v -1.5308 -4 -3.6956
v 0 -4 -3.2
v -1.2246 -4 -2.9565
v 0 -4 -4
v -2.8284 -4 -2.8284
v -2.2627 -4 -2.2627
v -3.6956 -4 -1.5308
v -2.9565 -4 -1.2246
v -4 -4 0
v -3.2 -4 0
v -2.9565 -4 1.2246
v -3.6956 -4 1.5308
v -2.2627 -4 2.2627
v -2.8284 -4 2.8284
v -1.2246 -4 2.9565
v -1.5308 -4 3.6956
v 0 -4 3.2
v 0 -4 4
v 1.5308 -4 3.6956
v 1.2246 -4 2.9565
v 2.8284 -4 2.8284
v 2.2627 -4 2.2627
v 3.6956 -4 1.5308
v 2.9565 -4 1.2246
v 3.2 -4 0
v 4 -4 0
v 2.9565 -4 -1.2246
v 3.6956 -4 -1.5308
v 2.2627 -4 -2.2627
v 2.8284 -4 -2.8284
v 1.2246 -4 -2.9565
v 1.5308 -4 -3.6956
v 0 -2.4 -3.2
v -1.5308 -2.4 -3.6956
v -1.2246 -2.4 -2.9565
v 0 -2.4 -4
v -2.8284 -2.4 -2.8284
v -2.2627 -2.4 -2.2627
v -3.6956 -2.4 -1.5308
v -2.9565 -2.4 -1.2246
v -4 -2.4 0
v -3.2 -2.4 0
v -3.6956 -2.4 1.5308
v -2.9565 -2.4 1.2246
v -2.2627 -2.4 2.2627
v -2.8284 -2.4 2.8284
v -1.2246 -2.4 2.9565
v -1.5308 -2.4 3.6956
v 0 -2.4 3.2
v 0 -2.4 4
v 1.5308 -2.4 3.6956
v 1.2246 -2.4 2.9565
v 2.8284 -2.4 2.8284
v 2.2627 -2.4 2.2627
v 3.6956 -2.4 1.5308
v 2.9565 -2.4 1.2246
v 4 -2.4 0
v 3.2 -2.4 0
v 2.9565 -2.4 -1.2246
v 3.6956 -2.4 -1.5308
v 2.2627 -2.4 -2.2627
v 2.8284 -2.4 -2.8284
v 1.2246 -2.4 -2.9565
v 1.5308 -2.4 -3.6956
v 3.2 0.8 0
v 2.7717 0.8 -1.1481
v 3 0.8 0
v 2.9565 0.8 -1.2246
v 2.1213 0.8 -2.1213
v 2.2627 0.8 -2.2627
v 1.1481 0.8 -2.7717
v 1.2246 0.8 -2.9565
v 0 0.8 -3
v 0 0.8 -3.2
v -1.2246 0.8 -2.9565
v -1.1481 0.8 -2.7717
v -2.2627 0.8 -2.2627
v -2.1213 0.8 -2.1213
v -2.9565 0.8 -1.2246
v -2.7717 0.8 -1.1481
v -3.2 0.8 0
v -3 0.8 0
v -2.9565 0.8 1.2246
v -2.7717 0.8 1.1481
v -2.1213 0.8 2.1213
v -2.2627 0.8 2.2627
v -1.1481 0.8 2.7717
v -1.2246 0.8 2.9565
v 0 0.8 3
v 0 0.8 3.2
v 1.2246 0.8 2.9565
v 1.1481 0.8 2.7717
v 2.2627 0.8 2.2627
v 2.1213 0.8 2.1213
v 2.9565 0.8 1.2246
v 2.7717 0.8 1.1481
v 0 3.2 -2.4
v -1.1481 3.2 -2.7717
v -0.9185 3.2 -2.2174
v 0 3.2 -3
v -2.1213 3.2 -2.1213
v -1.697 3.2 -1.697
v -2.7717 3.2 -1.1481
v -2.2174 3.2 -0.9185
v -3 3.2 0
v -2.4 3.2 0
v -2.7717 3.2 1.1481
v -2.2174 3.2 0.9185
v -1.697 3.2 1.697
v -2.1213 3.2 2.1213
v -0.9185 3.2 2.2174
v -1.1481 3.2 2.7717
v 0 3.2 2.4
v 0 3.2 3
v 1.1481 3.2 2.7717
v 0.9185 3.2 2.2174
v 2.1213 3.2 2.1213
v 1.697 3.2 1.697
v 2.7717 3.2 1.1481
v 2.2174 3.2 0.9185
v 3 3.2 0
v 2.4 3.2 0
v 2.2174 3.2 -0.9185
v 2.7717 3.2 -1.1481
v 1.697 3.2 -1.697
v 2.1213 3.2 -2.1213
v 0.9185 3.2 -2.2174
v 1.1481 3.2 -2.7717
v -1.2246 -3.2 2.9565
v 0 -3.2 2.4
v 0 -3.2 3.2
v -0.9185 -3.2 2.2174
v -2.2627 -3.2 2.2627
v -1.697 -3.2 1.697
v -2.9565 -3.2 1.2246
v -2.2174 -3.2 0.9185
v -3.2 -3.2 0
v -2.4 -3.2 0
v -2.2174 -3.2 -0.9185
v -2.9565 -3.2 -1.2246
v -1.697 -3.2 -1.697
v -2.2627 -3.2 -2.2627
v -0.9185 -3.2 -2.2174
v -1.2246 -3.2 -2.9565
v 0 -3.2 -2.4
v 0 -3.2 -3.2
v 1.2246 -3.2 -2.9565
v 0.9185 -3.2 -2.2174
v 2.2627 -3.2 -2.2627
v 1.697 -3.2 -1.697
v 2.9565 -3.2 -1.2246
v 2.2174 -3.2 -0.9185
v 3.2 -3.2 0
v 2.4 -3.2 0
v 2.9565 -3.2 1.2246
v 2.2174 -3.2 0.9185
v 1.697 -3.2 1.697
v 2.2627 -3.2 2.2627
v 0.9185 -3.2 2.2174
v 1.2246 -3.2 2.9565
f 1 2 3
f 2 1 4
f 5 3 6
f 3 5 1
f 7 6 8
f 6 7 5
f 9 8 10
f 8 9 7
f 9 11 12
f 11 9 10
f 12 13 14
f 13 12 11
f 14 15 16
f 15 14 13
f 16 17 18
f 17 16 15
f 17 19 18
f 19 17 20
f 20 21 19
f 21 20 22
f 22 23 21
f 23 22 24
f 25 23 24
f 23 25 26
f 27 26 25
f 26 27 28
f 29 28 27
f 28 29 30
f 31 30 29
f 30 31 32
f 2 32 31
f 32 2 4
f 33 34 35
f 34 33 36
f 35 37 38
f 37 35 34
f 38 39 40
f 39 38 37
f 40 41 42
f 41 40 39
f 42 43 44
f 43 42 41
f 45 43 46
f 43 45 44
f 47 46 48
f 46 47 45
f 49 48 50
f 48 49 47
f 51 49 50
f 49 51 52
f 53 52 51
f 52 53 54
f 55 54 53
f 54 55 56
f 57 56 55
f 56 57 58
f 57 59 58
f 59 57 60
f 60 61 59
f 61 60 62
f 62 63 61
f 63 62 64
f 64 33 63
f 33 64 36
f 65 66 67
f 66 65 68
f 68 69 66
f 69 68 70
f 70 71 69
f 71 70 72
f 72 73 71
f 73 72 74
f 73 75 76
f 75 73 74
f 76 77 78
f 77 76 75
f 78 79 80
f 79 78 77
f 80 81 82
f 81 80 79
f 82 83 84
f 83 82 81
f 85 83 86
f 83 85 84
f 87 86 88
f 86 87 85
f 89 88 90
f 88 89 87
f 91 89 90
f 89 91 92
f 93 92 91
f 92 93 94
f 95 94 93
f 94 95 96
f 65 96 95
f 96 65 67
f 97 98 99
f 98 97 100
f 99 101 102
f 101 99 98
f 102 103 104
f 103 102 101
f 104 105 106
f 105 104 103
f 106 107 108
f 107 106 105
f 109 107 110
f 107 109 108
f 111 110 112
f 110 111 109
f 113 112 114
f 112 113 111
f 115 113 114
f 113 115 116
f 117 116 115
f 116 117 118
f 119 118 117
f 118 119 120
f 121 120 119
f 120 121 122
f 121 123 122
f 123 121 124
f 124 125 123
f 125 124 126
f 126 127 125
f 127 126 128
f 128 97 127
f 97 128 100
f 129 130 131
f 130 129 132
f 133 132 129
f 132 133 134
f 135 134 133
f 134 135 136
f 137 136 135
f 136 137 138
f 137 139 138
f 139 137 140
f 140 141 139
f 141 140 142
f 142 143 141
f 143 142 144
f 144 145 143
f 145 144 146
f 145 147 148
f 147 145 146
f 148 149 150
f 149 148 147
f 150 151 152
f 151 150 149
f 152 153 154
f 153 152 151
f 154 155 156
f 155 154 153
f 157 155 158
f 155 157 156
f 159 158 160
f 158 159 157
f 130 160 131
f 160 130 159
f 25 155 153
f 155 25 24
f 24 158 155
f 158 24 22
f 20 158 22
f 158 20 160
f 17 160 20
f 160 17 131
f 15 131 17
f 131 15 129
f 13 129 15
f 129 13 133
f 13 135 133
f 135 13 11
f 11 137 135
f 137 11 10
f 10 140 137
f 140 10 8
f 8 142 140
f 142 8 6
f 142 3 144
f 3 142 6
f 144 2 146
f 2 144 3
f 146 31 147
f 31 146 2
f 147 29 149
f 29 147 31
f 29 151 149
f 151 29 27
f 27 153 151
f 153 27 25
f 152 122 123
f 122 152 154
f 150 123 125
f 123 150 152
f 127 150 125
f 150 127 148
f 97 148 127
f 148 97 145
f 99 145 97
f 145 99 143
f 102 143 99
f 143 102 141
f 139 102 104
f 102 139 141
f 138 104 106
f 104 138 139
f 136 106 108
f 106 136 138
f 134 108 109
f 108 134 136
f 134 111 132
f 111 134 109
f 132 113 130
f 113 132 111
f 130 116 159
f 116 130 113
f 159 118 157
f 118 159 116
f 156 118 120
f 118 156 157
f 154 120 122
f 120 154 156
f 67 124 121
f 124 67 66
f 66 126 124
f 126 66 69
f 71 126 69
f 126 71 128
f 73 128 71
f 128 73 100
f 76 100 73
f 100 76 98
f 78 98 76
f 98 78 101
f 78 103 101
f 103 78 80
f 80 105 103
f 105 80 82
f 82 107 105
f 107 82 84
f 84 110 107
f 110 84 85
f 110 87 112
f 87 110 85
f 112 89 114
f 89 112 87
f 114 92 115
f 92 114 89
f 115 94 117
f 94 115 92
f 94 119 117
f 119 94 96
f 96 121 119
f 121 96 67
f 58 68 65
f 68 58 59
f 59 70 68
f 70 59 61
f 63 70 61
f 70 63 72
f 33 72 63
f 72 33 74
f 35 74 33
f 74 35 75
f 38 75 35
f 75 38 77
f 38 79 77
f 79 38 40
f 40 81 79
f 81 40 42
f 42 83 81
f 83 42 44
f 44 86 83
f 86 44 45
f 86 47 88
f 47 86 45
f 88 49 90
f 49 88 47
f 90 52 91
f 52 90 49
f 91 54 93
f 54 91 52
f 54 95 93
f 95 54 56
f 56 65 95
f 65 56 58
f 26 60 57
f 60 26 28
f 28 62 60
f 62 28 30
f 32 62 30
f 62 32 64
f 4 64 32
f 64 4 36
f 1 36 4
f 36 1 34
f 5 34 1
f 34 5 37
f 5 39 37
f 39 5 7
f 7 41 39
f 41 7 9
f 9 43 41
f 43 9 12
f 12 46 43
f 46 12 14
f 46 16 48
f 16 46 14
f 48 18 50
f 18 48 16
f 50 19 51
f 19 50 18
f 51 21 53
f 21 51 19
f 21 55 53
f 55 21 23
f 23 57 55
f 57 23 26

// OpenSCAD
// file: ../p/4-4ring3.scad
use <../lib.scad>
function ldraw_lib__4_4ring3() = [
// 0 Ring  3 x 1.0
// 0 Name: 4-4ring3.dat
// 0 Author: James Jessiman
// 0 !LDRAW_ORG Primitive UPDATE 2009-01
// 0 !LICENSE Licensed under CC BY 2.0 and CC BY 4.0 : see CAreadme.txt
// 
// 0 BFC CERTIFY CCW
  [0,"BFC","CERTIFY"],
  [0,"BFC","CCW"],
// 
// 0 !HISTORY 1998-12-15 [PTadmin] Official Update 1998-10
// 0 !HISTORY 2002-04-05 [hafhead] Added BFC statement
// 0 !HISTORY 2002-04-25 [PTadmin] Official Update 2002-02
// 0 !HISTORY 2007-06-24 [PTadmin] Header formatted for Contributor Agreement
// 0 !HISTORY 2008-07-01 [PTadmin] Official Update 2008-01
// 0 !HISTORY 2008-08-26 [cwdee] Switch polygon winding and rename
// 0 !HISTORY 2009-05-02 [PTadmin] Official Update 2009-01
// 
// 
// 4 16 -1.5308 0 3.6956 -1.1481 0 2.7717 0 0 3 0 0 4
  [4,16,-1.5308,0,3.6956,-1.1481,0,2.7717,0,0,3,0,0,4],
// 4 16 -2.8284 0 2.8284 -2.1213 0 2.1213 -1.1481 0 2.7717 -1.5308 0 3.6956
  [4,16,-2.8284,0,2.8284,-2.1213,0,2.1213,-1.1481,0,2.7717,-1.5308,0,3.6956],
// 4 16 -3.6956 0 1.5308 -2.7717 0 1.1481 -2.1213 0 2.1213 -2.8284 0 2.8284
  [4,16,-3.6956,0,1.5308,-2.7717,0,1.1481,-2.1213,0,2.1213,-2.8284,0,2.8284],
// 4 16 -4 0 0 -3 0 0 -2.7717 0 1.1481 -3.6956 0 1.5308
  [4,16,-4,0,0,-3,0,0,-2.7717,0,1.1481,-3.6956,0,1.5308],
// 4 16 -3.6956 0 -1.5308 -2.7717 0 -1.1481 -3 0 0 -4 0 0
  [4,16,-3.6956,0,-1.5308,-2.7717,0,-1.1481,-3,0,0,-4,0,0],
// 4 16 -2.8284 0 -2.8284 -2.1213 0 -2.1213 -2.7717 0 -1.1481 -3.6956 0 -1.5308
  [4,16,-2.8284,0,-2.8284,-2.1213,0,-2.1213,-2.7717,0,-1.1481,-3.6956,0,-1.5308],
// 4 16 -1.5308 0 -3.6956 -1.1481 0 -2.7717 -2.1213 0 -2.1213 -2.8284 0 -2.8284
  [4,16,-1.5308,0,-3.6956,-1.1481,0,-2.7717,-2.1213,0,-2.1213,-2.8284,0,-2.8284],
// 4 16 0 0 -4 0 0 -3 -1.1481 0 -2.7717 -1.5308 0 -3.6956
  [4,16,0,0,-4,0,0,-3,-1.1481,0,-2.7717,-1.5308,0,-3.6956],
// 4 16 1.5308 0 -3.6956 1.1481 0 -2.7717 0 0 -3 0 0 -4
  [4,16,1.5308,0,-3.6956,1.1481,0,-2.7717,0,0,-3,0,0,-4],
// 4 16 2.8284 0 -2.8284 2.1213 0 -2.1213 1.1481 0 -2.7717 1.5308 0 -3.6956
  [4,16,2.8284,0,-2.8284,2.1213,0,-2.1213,1.1481,0,-2.7717,1.5308,0,-3.6956],
// 4 16 3.6956 0 -1.5308 2.7717 0 -1.1481 2.1213 0 -2.1213 2.8284 0 -2.8284
  [4,16,3.6956,0,-1.5308,2.7717,0,-1.1481,2.1213,0,-2.1213,2.8284,0,-2.8284],
// 4 16 4 0 0 3 0 0 2.7717 0 -1.1481 3.6956 0 -1.5308
  [4,16,4,0,0,3,0,0,2.7717,0,-1.1481,3.6956,0,-1.5308],
// 4 16 3.6956 0 1.5308 2.7717 0 1.1481 3 0 0 4 0 0
  [4,16,3.6956,0,1.5308,2.7717,0,1.1481,3,0,0,4,0,0],
// 4 16 2.8284 0 2.8284 2.1213 0 2.1213 2.7717 0 1.1481 3.6956 0 1.5308
  [4,16,2.8284,0,2.8284,2.1213,0,2.1213,2.7717,0,1.1481,3.6956,0,1.5308],
// 4 16 1.5308 0 3.6956 1.1481 0 2.7717 2.1213 0 2.1213 2.8284 0 2.8284
  [4,16,1.5308,0,3.6956,1.1481,0,2.7717,2.1213,0,2.1213,2.8284,0,2.8284],
// 4 16 0 0 4 0 0 3 1.1481 0 2.7717 1.5308 0 3.6956
  [4,16,0,0,4,0,0,3,1.1481,0,2.7717,1.5308,0,3.6956],
// 0
];
makepoly(ldraw_lib__4_4ring3(), line=0.2);
// file: ../p/peghole.scad
use <../lib.scad>
use <4-4cyli.scad>
use <4-4edge.scad>
use <4-4ring3.scad>
function ldraw_lib__peghole() = [
// 0 Peg Hole End
// 0 Name: peghole.dat
// 0 Author: James Jessiman
// 0 !LDRAW_ORG Primitive UPDATE 2010-01
// 0 !LICENSE Licensed under CC BY 2.0 and CC BY 4.0 : see CAreadme.txt
// 
// 0 BFC CERTIFY CCW
  [0,"BFC","CERTIFY"],
  [0,"BFC","CCW"],
// 
// 0 !HISTORY 2002-05-01 [mkennedy] replace code with ring3
// 0 !HISTORY 2002-05-01 [sbliss] BFC
// 0 !HISTORY 2002-06-11 [PTadmin] Official Update 2002-03
// 0 !HISTORY 2007-06-24 [PTadmin] Header formatted for Contributor Agreement
// 0 !HISTORY 2008-07-01 [PTadmin] Official Update 2008-01
// 0 !HISTORY 2010-01-14 [cwdee] Update ring3 to 4-4ring3
// 0 !HISTORY 2010-04-05 [PTadmin] Official Update 2010-01
// 
// 
// 1 16 0 0 0 8 0 0 0 1 0 0 0 8 4-4edge.dat
  [1,16,0,0,0,8,0,0,0,1,0,0,0,8, ldraw_lib__4_4edge()],
// 1 16 0 2 0 8 0 0 0 1 0 0 0 8 4-4edge.dat
  [1,16,0,2,0,8,0,0,0,1,0,0,0,8, ldraw_lib__4_4edge()],
// 1 16 0 2 0 6 0 0 0 1 0 0 0 6 4-4edge.dat
  [1,16,0,2,0,6,0,0,0,1,0,0,0,6, ldraw_lib__4_4edge()],
// 1 16 0 2 0 2 0 0 0 1 0 0 0 2 4-4ring3.dat
  [1,16,0,2,0,2,0,0,0,1,0,0,0,2, ldraw_lib__4_4ring3()],
// 0 BFC INVERTNEXT
  [0,"BFC","INVERTNEXT"],
// 1 16 0 0 0 8 0 0 0 2 0 0 0 8 4-4cyli.dat
  [1,16,0,0,0,8,0,0,0,2,0,0,0,8, ldraw_lib__4_4cyli()],
// 0
];
makepoly(ldraw_lib__peghole(), line=0.2);
// file: ../p/4-4ring4.scad
use <../lib.scad>
function ldraw_lib__4_4ring4() = [
// 0 Ring  4 x 1.0
// 0 Name: 4-4ring4.dat
// 0 Author: James Jessiman
// 0 !LDRAW_ORG Primitive UPDATE 2009-01
// 0 !LICENSE Licensed under CC BY 2.0 and CC BY 4.0 : see CAreadme.txt
// 
// 0 BFC CERTIFY CCW
  [0,"BFC","CERTIFY"],
  [0,"BFC","CCW"],
// 
// 0 !HISTORY 1998-12-15 [PTadmin] Official Update 1998-10
// 0 !HISTORY 2002-04-08 [BrickCaster] Modified for BFC compliance
// 0 !HISTORY 2002-04-25 [PTadmin] Official Update 2002-02
// 0 !HISTORY 2007-06-24 [PTadmin] Header formatted for Contributor Agreement
// 0 !HISTORY 2008-07-01 [PTadmin] Official Update 2008-01
// 0 !HISTORY 2008-08-26 [cwdee] Switch polygon winding and rename
// 0 !HISTORY 2009-05-02 [PTadmin] Official Update 2009-01
// 
// 
// 4 16 -1.9135 0 4.6195 -1.5308 0 3.6956 0 0 4 0 0 5
  [4,16,-1.9135,0,4.6195,-1.5308,0,3.6956,0,0,4,0,0,5],
// 4 16 -3.5355 0 3.5355 -2.8284 0 2.8284 -1.5308 0 3.6956 -1.9135 0 4.6195
  [4,16,-3.5355,0,3.5355,-2.8284,0,2.8284,-1.5308,0,3.6956,-1.9135,0,4.6195],
// 4 16 -4.6195 0 1.9135 -3.6956 0 1.5308 -2.8284 0 2.8284 -3.5355 0 3.5355
  [4,16,-4.6195,0,1.9135,-3.6956,0,1.5308,-2.8284,0,2.8284,-3.5355,0,3.5355],
// 4 16 -5 0 0 -4 0 0 -3.6956 0 1.5308 -4.6195 0 1.9135
  [4,16,-5,0,0,-4,0,0,-3.6956,0,1.5308,-4.6195,0,1.9135],
// 4 16 -4.6195 0 -1.9135 -3.6956 0 -1.5308 -4 0 0 -5 0 0
  [4,16,-4.6195,0,-1.9135,-3.6956,0,-1.5308,-4,0,0,-5,0,0],
// 4 16 -3.5355 0 -3.5355 -2.8284 0 -2.8284 -3.6956 0 -1.5308 -4.6195 0 -1.9135
  [4,16,-3.5355,0,-3.5355,-2.8284,0,-2.8284,-3.6956,0,-1.5308,-4.6195,0,-1.9135],
// 4 16 -1.9135 0 -4.6195 -1.5308 0 -3.6956 -2.8284 0 -2.8284 -3.5355 0 -3.5355
  [4,16,-1.9135,0,-4.6195,-1.5308,0,-3.6956,-2.8284,0,-2.8284,-3.5355,0,-3.5355],
// 4 16 0 0 -5 0 0 -4 -1.5308 0 -3.6956 -1.9135 0 -4.6195
  [4,16,0,0,-5,0,0,-4,-1.5308,0,-3.6956,-1.9135,0,-4.6195],
// 4 16 1.9135 0 -4.6195 1.5308 0 -3.6956 0 0 -4 0 0 -5
  [4,16,1.9135,0,-4.6195,1.5308,0,-3.6956,0,0,-4,0,0,-5],
// 4 16 3.5355 0 -3.5355 2.8284 0 -2.8284 1.5308 0 -3.6956 1.9135 0 -4.6195
  [4,16,3.5355,0,-3.5355,2.8284,0,-2.8284,1.5308,0,-3.6956,1.9135,0,-4.6195],
// 4 16 4.6195 0 -1.9135 3.6956 0 -1.5308 2.8284 0 -2.8284 3.5355 0 -3.5355
  [4,16,4.6195,0,-1.9135,3.6956,0,-1.5308,2.8284,0,-2.8284,3.5355,0,-3.5355],
// 4 16 5 0 0 4 0 0 3.6956 0 -1.5308 4.6195 0 -1.9135
  [4,16,5,0,0,4,0,0,3.6956,0,-1.5308,4.6195,0,-1.9135],
// 4 16 4.6195 0 1.9135 3.6956 0 1.5308 4 0 0 5 0 0
  [4,16,4.6195,0,1.9135,3.6956,0,1.5308,4,0,0,5,0,0],
// 4 16 3.5355 0 3.5355 2.8284 0 2.8284 3.6956 0 1.5308 4.6195 0 1.9135
  [4,16,3.5355,0,3.5355,2.8284,0,2.8284,3.6956,0,1.5308,4.6195,0,1.9135],
// 4 16 1.9135 0 4.6195 1.5308 0 3.6956 2.8284 0 2.8284 3.5355 0 3.5355
  [4,16,1.9135,0,4.6195,1.5308,0,3.6956,2.8284,0,2.8284,3.5355,0,3.5355],
// 4 16 0 0 5 0 0 4 1.5308 0 3.6956 1.9135 0 4.6195
  [4,16,0,0,5,0,0,4,1.5308,0,3.6956,1.9135,0,4.6195],
// 0
];
makepoly(ldraw_lib__4_4ring4(), line=0.2);
// file: ../p/4-4rin15.scad
use <../lib.scad>
function ldraw_lib__4_4rin15() = [
// 0 Ring 15 x 1.0
// 0 Name: 4-4rin15.dat
// 0 Author: Mark Kennedy [mkennedy]
// 0 !LDRAW_ORG Primitive UPDATE 2012-01
// 0 !LICENSE Licensed under CC BY 2.0 and CC BY 4.0 : see CAreadme.txt
// 
// 0 BFC CERTIFY CCW
  [0,"BFC","CERTIFY"],
  [0,"BFC","CCW"],
// 
// 0 !HISTORY 2004-04-22 [PTadmin] Official Update 2004-02
// 0 !HISTORY 2007-06-24 [PTadmin] Header formatted for Contributor Agreement
// 0 !HISTORY 2008-07-01 [PTadmin] Official Update 2008-01
// 0 !HISTORY 2012-02-16 [Philo] Changed to CCW
// 0 !HISTORY 2012-03-30 [PTadmin] Official Update 2012-01
// 
// 
// 4 16 16 0 0 14.7824 0 6.1232 13.8585 0 5.7405 15 0 0
  [4,16,16,0,0,14.7824,0,6.1232,13.8585,0,5.7405,15,0,0],
// 4 16 14.7824 0 6.1232 11.3136 0 11.3136 10.6065 0 10.6065 13.8585 0 5.7405
  [4,16,14.7824,0,6.1232,11.3136,0,11.3136,10.6065,0,10.6065,13.8585,0,5.7405],
// 4 16 11.3136 0 11.3136 6.1232 0 14.7824 5.7405 0 13.8585 10.6065 0 10.6065
  [4,16,11.3136,0,11.3136,6.1232,0,14.7824,5.7405,0,13.8585,10.6065,0,10.6065],
// 4 16 6.1232 0 14.7824 0 0 16 0 0 15 5.7405 0 13.8585
  [4,16,6.1232,0,14.7824,0,0,16,0,0,15,5.7405,0,13.8585],
// 4 16 0 0 16 -6.1232 0 14.7824 -5.7405 0 13.8585 0 0 15
  [4,16,0,0,16,-6.1232,0,14.7824,-5.7405,0,13.8585,0,0,15],
// 4 16 -6.1232 0 14.7824 -11.3136 0 11.3136 -10.6065 0 10.6065 -5.7405 0 13.8585
  [4,16,-6.1232,0,14.7824,-11.3136,0,11.3136,-10.6065,0,10.6065,-5.7405,0,13.8585],
// 4 16 -11.3136 0 11.3136 -14.7824 0 6.1232 -13.8585 0 5.7405 -10.6065 0 10.6065
  [4,16,-11.3136,0,11.3136,-14.7824,0,6.1232,-13.8585,0,5.7405,-10.6065,0,10.6065],
// 4 16 -14.7824 0 6.1232 -16 0 0 -15 0 0 -13.8585 0 5.7405
  [4,16,-14.7824,0,6.1232,-16,0,0,-15,0,0,-13.8585,0,5.7405],
// 4 16 -16 0 0 -14.7824 0 -6.1232 -13.8585 0 -5.7405 -15 0 0
  [4,16,-16,0,0,-14.7824,0,-6.1232,-13.8585,0,-5.7405,-15,0,0],
// 4 16 -14.7824 0 -6.1232 -11.3136 0 -11.3136 -10.6065 0 -10.6065 -13.8585 0 -5.7405
  [4,16,-14.7824,0,-6.1232,-11.3136,0,-11.3136,-10.6065,0,-10.6065,-13.8585,0,-5.7405],
// 4 16 -11.3136 0 -11.3136 -6.1232 0 -14.7824 -5.7405 0 -13.8585 -10.6065 0 -10.6065
  [4,16,-11.3136,0,-11.3136,-6.1232,0,-14.7824,-5.7405,0,-13.8585,-10.6065,0,-10.6065],
// 4 16 -6.1232 0 -14.7824 0 0 -16 0 0 -15 -5.7405 0 -13.8585
  [4,16,-6.1232,0,-14.7824,0,0,-16,0,0,-15,-5.7405,0,-13.8585],
// 4 16 0 0 -16 6.1232 0 -14.7824 5.7405 0 -13.8585 0 0 -15
  [4,16,0,0,-16,6.1232,0,-14.7824,5.7405,0,-13.8585,0,0,-15],
// 4 16 6.1232 0 -14.7824 11.3136 0 -11.3136 10.6065 0 -10.6065 5.7405 0 -13.8585
  [4,16,6.1232,0,-14.7824,11.3136,0,-11.3136,10.6065,0,-10.6065,5.7405,0,-13.8585],
// 4 16 11.3136 0 -11.3136 14.7824 0 -6.1232 13.8585 0 -5.7405 10.6065 0 -10.6065
  [4,16,11.3136,0,-11.3136,14.7824,0,-6.1232,13.8585,0,-5.7405,10.6065,0,-10.6065],
// 4 16 14.7824 0 -6.1232 16 0 0 15 0 0 13.8585 0 -5.7405
  [4,16,14.7824,0,-6.1232,16,0,0,15,0,0,13.8585,0,-5.7405],
];
makepoly(ldraw_lib__4_4rin15(), line=0.2);
// file: ../p/4-4edge.scad
use <../lib.scad>
function ldraw_lib__4_4edge() = [
// 0 Circle 1.0
// 0 Name: 4-4edge.dat
// 0 Author: James Jessiman
// 0 !LDRAW_ORG Primitive UPDATE 2017-01
// 0 !LICENSE Licensed under CC BY 2.0 and CC BY 4.0 : see CAreadme.txt
// 
// 0 BFC CERTIFY CCW
  [0,"BFC","CERTIFY"],
  [0,"BFC","CCW"],
// 
// 0 !HISTORY 1998-12-15 [PTadmin] Official Update 1998-10
// 0 !HISTORY 2005-12-28 [PTadmin] Official Update 2005-01
// 0 !HISTORY 2007-06-24 [PTadmin] Header formatted for Contributor Agreement
// 0 !HISTORY 2008-07-01 [PTadmin] Official Update 2008-01
// 0 !HISTORY 2017-01-15 [Steffen] BFCed
// 0 !HISTORY 2017-12-30 [PTadmin] Official Update 2017-01
// 
// 
// 2 24 1 0 0 0.9239 0 0.3827
  [2,24,1,0,0,0.9239,0,0.3827],
// 2 24 0.9239 0 0.3827 0.7071 0 0.7071
  [2,24,0.9239,0,0.3827,0.7071,0,0.7071],
// 2 24 0.7071 0 0.7071 0.3827 0 0.9239
  [2,24,0.7071,0,0.7071,0.3827,0,0.9239],
// 2 24 0.3827 0 0.9239 0 0 1
  [2,24,0.3827,0,0.9239,0,0,1],
// 2 24 0 0 1 -0.3827 0 0.9239
  [2,24,0,0,1,-0.3827,0,0.9239],
// 2 24 -0.3827 0 0.9239 -0.7071 0 0.7071
  [2,24,-0.3827,0,0.9239,-0.7071,0,0.7071],
// 2 24 -0.7071 0 0.7071 -0.9239 0 0.3827
  [2,24,-0.7071,0,0.7071,-0.9239,0,0.3827],
// 2 24 -0.9239 0 0.3827 -1 0 -0
  [2,24,-0.9239,0,0.3827,-1,0,-0],
// 2 24 -1 0 -0 -0.9239 0 -0.3827
  [2,24,-1,0,-0,-0.9239,0,-0.3827],
// 2 24 -0.9239 0 -0.3827 -0.7071 0 -0.7071
  [2,24,-0.9239,0,-0.3827,-0.7071,0,-0.7071],
// 2 24 -0.7071 0 -0.7071 -0.3827 0 -0.9239
  [2,24,-0.7071,0,-0.7071,-0.3827,0,-0.9239],
// 2 24 -0.3827 0 -0.9239 0 0 -1
  [2,24,-0.3827,0,-0.9239,0,0,-1],
// 2 24 0 0 -1 0.3827 0 -0.9239
  [2,24,0,0,-1,0.3827,0,-0.9239],
// 2 24 0.3827 0 -0.9239 0.7071 0 -0.7071
  [2,24,0.3827,0,-0.9239,0.7071,0,-0.7071],
// 2 24 0.7071 0 -0.7071 0.9239 0 -0.3827
  [2,24,0.7071,0,-0.7071,0.9239,0,-0.3827],
// 2 24 0.9239 0 -0.3827 1 0 0
  [2,24,0.9239,0,-0.3827,1,0,0],
];
makepoly(ldraw_lib__4_4edge(), line=0.2);
// file: ../p/4-4cyli.scad
use <../lib.scad>
function ldraw_lib__4_4cyli() = [
// 0 Cylinder 1.0
// 0 Name: 4-4cyli.dat
// 0 Author: James Jessiman
// 0 !LDRAW_ORG Primitive UPDATE 2005-01
// 0 !LICENSE Licensed under CC BY 2.0 and CC BY 4.0 : see CAreadme.txt
// 
// 0 BFC CERTIFY CCW
  [0,"BFC","CERTIFY"],
  [0,"BFC","CCW"],
// 
// 0 !HISTORY 1998-12-15 [PTadmin] Official Update 1998-10
// 0 !HISTORY 2002-03-23 [sbliss] Added BFC statement; merged headers from files in distributions LDraw 0.27 and Complete.
// 0 !HISTORY 2002-04-25 [PTadmin] Official Update 2002-02
// 0 !HISTORY 2004-12-14 [guyvivan] BFC CCW
// 0 !HISTORY 2005-12-28 [PTadmin] Official Update 2005-01
// 0 !HISTORY 2007-06-24 [PTadmin] Header formatted for Contributor Agreement
// 0 !HISTORY 2008-07-01 [PTadmin] Official Update 2008-01
// 
// 
// 4 16 1 1 0 0.9239 1 0.3827 0.9239 0 0.3827 1 0 0
  [4,16,1,1,0,0.9239,1,0.3827,0.9239,0,0.3827,1,0,0],
// 5 24 1 0 0 1 1 0 0.9239 0 0.3827 0.9239 0 -0.3827
  [5,24,1,0,0,1,1,0,0.9239,0,0.3827,0.9239,0,-0.3827],
// 4 16 0.9239 1 0.3827 0.7071 1 0.7071 0.7071 0 0.7071 0.9239 0 0.3827
  [4,16,0.9239,1,0.3827,0.7071,1,0.7071,0.7071,0,0.7071,0.9239,0,0.3827],
// 5 24 0.9239 0 0.3827 0.9239 1 0.3827 0.7071 0 0.7071 1 0 0
  [5,24,0.9239,0,0.3827,0.9239,1,0.3827,0.7071,0,0.7071,1,0,0],
// 4 16 0.7071 1 0.7071 0.3827 1 0.9239 0.3827 0 0.9239 0.7071 0 0.7071
  [4,16,0.7071,1,0.7071,0.3827,1,0.9239,0.3827,0,0.9239,0.7071,0,0.7071],
// 5 24 0.7071 0 0.7071 0.7071 1 0.7071 0.3827 0 0.9239 0.9239 0 0.3827
  [5,24,0.7071,0,0.7071,0.7071,1,0.7071,0.3827,0,0.9239,0.9239,0,0.3827],
// 4 16 0.3827 1 0.9239 0 1 1 0 0 1 0.3827 0 0.9239
  [4,16,0.3827,1,0.9239,0,1,1,0,0,1,0.3827,0,0.9239],
// 5 24 0.3827 0 0.9239 0.3827 1 0.9239 0 0 1 0.7071 0 0.7071
  [5,24,0.3827,0,0.9239,0.3827,1,0.9239,0,0,1,0.7071,0,0.7071],
// 4 16 0 1 1 -0.3827 1 0.9239 -0.3827 0 0.9239 0 0 1
  [4,16,0,1,1,-0.3827,1,0.9239,-0.3827,0,0.9239,0,0,1],
// 5 24 0 0 1 0 1 1 -0.3827 0 0.9239 0.3827 0 0.9239
  [5,24,0,0,1,0,1,1,-0.3827,0,0.9239,0.3827,0,0.9239],
// 4 16 -0.3827 1 0.9239 -0.7071 1 0.7071 -0.7071 0 0.7071 -0.3827 0 0.9239
  [4,16,-0.3827,1,0.9239,-0.7071,1,0.7071,-0.7071,0,0.7071,-0.3827,0,0.9239],
// 5 24 -0.3827 0 0.9239 -0.3827 1 0.9239 -0.7071 0 0.7071 0 0 1
  [5,24,-0.3827,0,0.9239,-0.3827,1,0.9239,-0.7071,0,0.7071,0,0,1],
// 4 16 -0.7071 1 0.7071 -0.9239 1 0.3827 -0.9239 0 0.3827 -0.7071 0 0.7071
  [4,16,-0.7071,1,0.7071,-0.9239,1,0.3827,-0.9239,0,0.3827,-0.7071,0,0.7071],
// 5 24 -0.7071 0 0.7071 -0.7071 1 0.7071 -0.9239 0 0.3827 -0.3827 0 0.9239
  [5,24,-0.7071,0,0.7071,-0.7071,1,0.7071,-0.9239,0,0.3827,-0.3827,0,0.9239],
// 4 16 -0.9239 1 0.3827 -1 1 0 -1 0 0 -0.9239 0 0.3827
  [4,16,-0.9239,1,0.3827,-1,1,0,-1,0,0,-0.9239,0,0.3827],
// 5 24 -0.9239 0 0.3827 -0.9239 1 0.3827 -1 0 0 -0.7071 0 0.7071
  [5,24,-0.9239,0,0.3827,-0.9239,1,0.3827,-1,0,0,-0.7071,0,0.7071],
// 4 16 -1 1 0 -0.9239 1 -0.3827 -0.9239 0 -0.3827 -1 0 0
  [4,16,-1,1,0,-0.9239,1,-0.3827,-0.9239,0,-0.3827,-1,0,0],
// 5 24 -1 0 0 -1 1 0 -0.9239 0 -0.3827 -0.9239 0 0.3827
  [5,24,-1,0,0,-1,1,0,-0.9239,0,-0.3827,-0.9239,0,0.3827],
// 4 16 -0.9239 1 -0.3827 -0.7071 1 -0.7071 -0.7071 0 -0.7071 -0.9239 0 -0.3827
  [4,16,-0.9239,1,-0.3827,-0.7071,1,-0.7071,-0.7071,0,-0.7071,-0.9239,0,-0.3827],
// 5 24 -0.9239 0 -0.3827 -0.9239 1 -0.3827 -0.7071 0 -0.7071 -1 0 0
  [5,24,-0.9239,0,-0.3827,-0.9239,1,-0.3827,-0.7071,0,-0.7071,-1,0,0],
// 4 16 -0.7071 1 -0.7071 -0.3827 1 -0.9239 -0.3827 0 -0.9239 -0.7071 0 -0.7071
  [4,16,-0.7071,1,-0.7071,-0.3827,1,-0.9239,-0.3827,0,-0.9239,-0.7071,0,-0.7071],
// 5 24 -0.7071 0 -0.7071 -0.7071 1 -0.7071 -0.3827 0 -0.9239 -0.9239 0 -0.3827
  [5,24,-0.7071,0,-0.7071,-0.7071,1,-0.7071,-0.3827,0,-0.9239,-0.9239,0,-0.3827],
// 4 16 -0.3827 1 -0.9239 0 1 -1 0 0 -1 -0.3827 0 -0.9239
  [4,16,-0.3827,1,-0.9239,0,1,-1,0,0,-1,-0.3827,0,-0.9239],
// 5 24 -0.3827 0 -0.9239 -0.3827 1 -0.9239 0 0 -1 -0.7071 0 -0.7071
  [5,24,-0.3827,0,-0.9239,-0.3827,1,-0.9239,0,0,-1,-0.7071,0,-0.7071],
// 4 16 0 1 -1 0.3827 1 -0.9239 0.3827 0 -0.9239 0 0 -1
  [4,16,0,1,-1,0.3827,1,-0.9239,0.3827,0,-0.9239,0,0,-1],
// 5 24 0 0 -1 0 1 -1 0.3827 0 -0.9239 -0.3827 0 -0.9239
  [5,24,0,0,-1,0,1,-1,0.3827,0,-0.9239,-0.3827,0,-0.9239],
// 4 16 0.3827 1 -0.9239 0.7071 1 -0.7071 0.7071 0 -0.7071 0.3827 0 -0.9239
  [4,16,0.3827,1,-0.9239,0.7071,1,-0.7071,0.7071,0,-0.7071,0.3827,0,-0.9239],
// 5 24 0.3827 0 -0.9239 0.3827 1 -0.9239 0.7071 0 -0.7071 0 0 -1
  [5,24,0.3827,0,-0.9239,0.3827,1,-0.9239,0.7071,0,-0.7071,0,0,-1],
// 4 16 0.7071 1 -0.7071 0.9239 1 -0.3827 0.9239 0 -0.3827 0.7071 0 -0.7071
  [4,16,0.7071,1,-0.7071,0.9239,1,-0.3827,0.9239,0,-0.3827,0.7071,0,-0.7071],
// 5 24 0.7071 0 -0.7071 0.7071 1 -0.7071 0.9239 0 -0.3827 0.3827 0 -0.9239
  [5,24,0.7071,0,-0.7071,0.7071,1,-0.7071,0.9239,0,-0.3827,0.3827,0,-0.9239],
// 4 16 0.9239 1 -0.3827 1 1 0 1 0 0 0.9239 0 -0.3827
  [4,16,0.9239,1,-0.3827,1,1,0,1,0,0,0.9239,0,-0.3827],
// 5 24 0.9239 0 -0.3827 0.9239 1 -0.3827 1 0 0 0.7071 0 -0.7071
  [5,24,0.9239,0,-0.3827,0.9239,1,-0.3827,1,0,0,0.7071,0,-0.7071],
// 0
];
makepoly(ldraw_lib__4_4cyli(), line=0.2);
// file: 6221.scad
use <../lib.scad>
use <../p/4-4cyli.scad>
use <../p/4-4edge.scad>
use <../p/4-4rin15.scad>
use <../p/4-4ring4.scad>
use <../p/peghole.scad>
function ldraw_lib__6221() = [
// 0 Technic Handle
// 0 Name: 6221.dat
// 0 Author: James Jessiman
// 0 !LDRAW_ORG Part UPDATE 2010-02
// 0 !LICENSE Licensed under CC BY 2.0 and CC BY 4.0 : see CAreadme.txt
// 
// 0 BFC CERTIFY CW
  [0,"BFC","CERTIFY"],
  [0,"BFC","CW"],
// 
// 0 !HISTORY 2007-08-31 [Philo] BFC'ed, used ring primitives; Checked against The LEGO Universe Team version
// 0 !HISTORY 2010-07-05 [PTadmin] Official Update 2010-02
// 
// 
// 1 16 0 0 8 6 0 0 0 0 6 0 1 0 4-4edge.dat
  [1,16,0,0,8,6,0,0,0,0,6,0,1,0, ldraw_lib__4_4edge()],
// 1 16 0 0 8 7.5 0 0 0 0 7.5 0 1 0 4-4edge.dat
  [1,16,0,0,8,7.5,0,0,0,0,7.5,0,1,0, ldraw_lib__4_4edge()],
// 1 16 0 0 2 7.5 0 0 0 0 7.5 0 1 0 4-4edge.dat
  [1,16,0,0,2,7.5,0,0,0,0,7.5,0,1,0, ldraw_lib__4_4edge()],
// 1 16 0 0 2 8 0 0 0 0 8 0 1 0 4-4edge.dat
  [1,16,0,0,2,8,0,0,0,0,8,0,1,0, ldraw_lib__4_4edge()],
// 1 16 0 0 -6 8 0 0 0 0 8 0 1 0 4-4edge.dat
  [1,16,0,0,-6,8,0,0,0,0,8,0,1,0, ldraw_lib__4_4edge()],
// 1 16 0 0 -6 10 0 0 0 0 10 0 1 0 4-4edge.dat
  [1,16,0,0,-6,10,0,0,0,0,10,0,1,0, ldraw_lib__4_4edge()],
// 1 16 0 0 -10 10 0 0 0 0 10 0 1 0 4-4edge.dat
  [1,16,0,0,-10,10,0,0,0,0,10,0,1,0, ldraw_lib__4_4edge()],
// 1 16 0 0 -10 2 0 0 0 0 2 0 1 0 4-4ring4.dat
  [1,16,0,0,-10,2,0,0,0,0,2,0,1,0, ldraw_lib__4_4ring4()],
// 1 16 0 0 -6 2 0 0 0 0 2 0 -1 0 4-4ring4.dat
  [1,16,0,0,-6,2,0,0,0,0,2,0,-1,0, ldraw_lib__4_4ring4()],
// 1 16 0 0 2 0.5 0 0 0 0 0.5 0 -1 0 4-4rin15.dat
  [1,16,0,0,2,0.5,0,0,0,0,0.5,0,-1,0, ldraw_lib__4_4rin15()],
// 1 16 0 0 8 1.5 0 0 0 0 1.5 0 -1 0 4-4ring4.dat
  [1,16,0,0,8,1.5,0,0,0,0,1.5,0,-1,0, ldraw_lib__4_4ring4()],
// 1 16 0 0 -10 1 0 0 0 0 -1 0 1 0 peghole.dat
  [1,16,0,0,-10,1,0,0,0,0,-1,0,1,0, ldraw_lib__peghole()],
// 0 BFC INVERTNEXT
  [0,"BFC","INVERTNEXT"],
// 1 16 0 0 8 6 0 0 0 0 6 0 -16 0 4-4cyli.dat
  [1,16,0,0,8,6,0,0,0,0,6,0,-16,0, ldraw_lib__4_4cyli()],
// 1 16 0 0 8 7.5 0 0 0 0 7.5 0 -6 0 4-4cyli.dat
  [1,16,0,0,8,7.5,0,0,0,0,7.5,0,-6,0, ldraw_lib__4_4cyli()],
// 1 16 0 0 2 8 0 0 0 0 8 0 -8 0 4-4cyli.dat
  [1,16,0,0,2,8,0,0,0,0,8,0,-8,0, ldraw_lib__4_4cyli()],
// 1 16 0 0 -6 10 0 0 0 0 10 0 -4 0 4-4cyli.dat
  [1,16,0,0,-6,10,0,0,0,0,10,0,-4,0, ldraw_lib__4_4cyli()],
// 0
];
makepoly(ldraw_lib__6221(), line=0.2);
// main file
use <../lib.scad>
use <6221.scad>
function ldraw_lib__424() = [
// 0 ~Moved to 6221
// 0 Name: 424.dat
// 0 Author: [PTadmin]
// 0 !LDRAW_ORG Part UPDATE 2010-02
// 0 !LICENSE Licensed under CC BY 4.0 : see CAreadme.txt
// 
// 0 BFC CERTIFY CCW
  [0,"BFC","CERTIFY"],
  [0,"BFC","CCW"],
// 
// 0 !HISTORY 2010-07-05 [PTadmin] Official Update 2010-02
// 
// 
// 0 // Technic Handle
// 1 16 0 0 0 1 0 0 0 1 0 0 0 1 6221.dat
  [1,16,0,0,0,1,0,0,0,1,0,0,0,1, ldraw_lib__6221()],
];
makepoly(ldraw_lib__424(), line=0.2);
